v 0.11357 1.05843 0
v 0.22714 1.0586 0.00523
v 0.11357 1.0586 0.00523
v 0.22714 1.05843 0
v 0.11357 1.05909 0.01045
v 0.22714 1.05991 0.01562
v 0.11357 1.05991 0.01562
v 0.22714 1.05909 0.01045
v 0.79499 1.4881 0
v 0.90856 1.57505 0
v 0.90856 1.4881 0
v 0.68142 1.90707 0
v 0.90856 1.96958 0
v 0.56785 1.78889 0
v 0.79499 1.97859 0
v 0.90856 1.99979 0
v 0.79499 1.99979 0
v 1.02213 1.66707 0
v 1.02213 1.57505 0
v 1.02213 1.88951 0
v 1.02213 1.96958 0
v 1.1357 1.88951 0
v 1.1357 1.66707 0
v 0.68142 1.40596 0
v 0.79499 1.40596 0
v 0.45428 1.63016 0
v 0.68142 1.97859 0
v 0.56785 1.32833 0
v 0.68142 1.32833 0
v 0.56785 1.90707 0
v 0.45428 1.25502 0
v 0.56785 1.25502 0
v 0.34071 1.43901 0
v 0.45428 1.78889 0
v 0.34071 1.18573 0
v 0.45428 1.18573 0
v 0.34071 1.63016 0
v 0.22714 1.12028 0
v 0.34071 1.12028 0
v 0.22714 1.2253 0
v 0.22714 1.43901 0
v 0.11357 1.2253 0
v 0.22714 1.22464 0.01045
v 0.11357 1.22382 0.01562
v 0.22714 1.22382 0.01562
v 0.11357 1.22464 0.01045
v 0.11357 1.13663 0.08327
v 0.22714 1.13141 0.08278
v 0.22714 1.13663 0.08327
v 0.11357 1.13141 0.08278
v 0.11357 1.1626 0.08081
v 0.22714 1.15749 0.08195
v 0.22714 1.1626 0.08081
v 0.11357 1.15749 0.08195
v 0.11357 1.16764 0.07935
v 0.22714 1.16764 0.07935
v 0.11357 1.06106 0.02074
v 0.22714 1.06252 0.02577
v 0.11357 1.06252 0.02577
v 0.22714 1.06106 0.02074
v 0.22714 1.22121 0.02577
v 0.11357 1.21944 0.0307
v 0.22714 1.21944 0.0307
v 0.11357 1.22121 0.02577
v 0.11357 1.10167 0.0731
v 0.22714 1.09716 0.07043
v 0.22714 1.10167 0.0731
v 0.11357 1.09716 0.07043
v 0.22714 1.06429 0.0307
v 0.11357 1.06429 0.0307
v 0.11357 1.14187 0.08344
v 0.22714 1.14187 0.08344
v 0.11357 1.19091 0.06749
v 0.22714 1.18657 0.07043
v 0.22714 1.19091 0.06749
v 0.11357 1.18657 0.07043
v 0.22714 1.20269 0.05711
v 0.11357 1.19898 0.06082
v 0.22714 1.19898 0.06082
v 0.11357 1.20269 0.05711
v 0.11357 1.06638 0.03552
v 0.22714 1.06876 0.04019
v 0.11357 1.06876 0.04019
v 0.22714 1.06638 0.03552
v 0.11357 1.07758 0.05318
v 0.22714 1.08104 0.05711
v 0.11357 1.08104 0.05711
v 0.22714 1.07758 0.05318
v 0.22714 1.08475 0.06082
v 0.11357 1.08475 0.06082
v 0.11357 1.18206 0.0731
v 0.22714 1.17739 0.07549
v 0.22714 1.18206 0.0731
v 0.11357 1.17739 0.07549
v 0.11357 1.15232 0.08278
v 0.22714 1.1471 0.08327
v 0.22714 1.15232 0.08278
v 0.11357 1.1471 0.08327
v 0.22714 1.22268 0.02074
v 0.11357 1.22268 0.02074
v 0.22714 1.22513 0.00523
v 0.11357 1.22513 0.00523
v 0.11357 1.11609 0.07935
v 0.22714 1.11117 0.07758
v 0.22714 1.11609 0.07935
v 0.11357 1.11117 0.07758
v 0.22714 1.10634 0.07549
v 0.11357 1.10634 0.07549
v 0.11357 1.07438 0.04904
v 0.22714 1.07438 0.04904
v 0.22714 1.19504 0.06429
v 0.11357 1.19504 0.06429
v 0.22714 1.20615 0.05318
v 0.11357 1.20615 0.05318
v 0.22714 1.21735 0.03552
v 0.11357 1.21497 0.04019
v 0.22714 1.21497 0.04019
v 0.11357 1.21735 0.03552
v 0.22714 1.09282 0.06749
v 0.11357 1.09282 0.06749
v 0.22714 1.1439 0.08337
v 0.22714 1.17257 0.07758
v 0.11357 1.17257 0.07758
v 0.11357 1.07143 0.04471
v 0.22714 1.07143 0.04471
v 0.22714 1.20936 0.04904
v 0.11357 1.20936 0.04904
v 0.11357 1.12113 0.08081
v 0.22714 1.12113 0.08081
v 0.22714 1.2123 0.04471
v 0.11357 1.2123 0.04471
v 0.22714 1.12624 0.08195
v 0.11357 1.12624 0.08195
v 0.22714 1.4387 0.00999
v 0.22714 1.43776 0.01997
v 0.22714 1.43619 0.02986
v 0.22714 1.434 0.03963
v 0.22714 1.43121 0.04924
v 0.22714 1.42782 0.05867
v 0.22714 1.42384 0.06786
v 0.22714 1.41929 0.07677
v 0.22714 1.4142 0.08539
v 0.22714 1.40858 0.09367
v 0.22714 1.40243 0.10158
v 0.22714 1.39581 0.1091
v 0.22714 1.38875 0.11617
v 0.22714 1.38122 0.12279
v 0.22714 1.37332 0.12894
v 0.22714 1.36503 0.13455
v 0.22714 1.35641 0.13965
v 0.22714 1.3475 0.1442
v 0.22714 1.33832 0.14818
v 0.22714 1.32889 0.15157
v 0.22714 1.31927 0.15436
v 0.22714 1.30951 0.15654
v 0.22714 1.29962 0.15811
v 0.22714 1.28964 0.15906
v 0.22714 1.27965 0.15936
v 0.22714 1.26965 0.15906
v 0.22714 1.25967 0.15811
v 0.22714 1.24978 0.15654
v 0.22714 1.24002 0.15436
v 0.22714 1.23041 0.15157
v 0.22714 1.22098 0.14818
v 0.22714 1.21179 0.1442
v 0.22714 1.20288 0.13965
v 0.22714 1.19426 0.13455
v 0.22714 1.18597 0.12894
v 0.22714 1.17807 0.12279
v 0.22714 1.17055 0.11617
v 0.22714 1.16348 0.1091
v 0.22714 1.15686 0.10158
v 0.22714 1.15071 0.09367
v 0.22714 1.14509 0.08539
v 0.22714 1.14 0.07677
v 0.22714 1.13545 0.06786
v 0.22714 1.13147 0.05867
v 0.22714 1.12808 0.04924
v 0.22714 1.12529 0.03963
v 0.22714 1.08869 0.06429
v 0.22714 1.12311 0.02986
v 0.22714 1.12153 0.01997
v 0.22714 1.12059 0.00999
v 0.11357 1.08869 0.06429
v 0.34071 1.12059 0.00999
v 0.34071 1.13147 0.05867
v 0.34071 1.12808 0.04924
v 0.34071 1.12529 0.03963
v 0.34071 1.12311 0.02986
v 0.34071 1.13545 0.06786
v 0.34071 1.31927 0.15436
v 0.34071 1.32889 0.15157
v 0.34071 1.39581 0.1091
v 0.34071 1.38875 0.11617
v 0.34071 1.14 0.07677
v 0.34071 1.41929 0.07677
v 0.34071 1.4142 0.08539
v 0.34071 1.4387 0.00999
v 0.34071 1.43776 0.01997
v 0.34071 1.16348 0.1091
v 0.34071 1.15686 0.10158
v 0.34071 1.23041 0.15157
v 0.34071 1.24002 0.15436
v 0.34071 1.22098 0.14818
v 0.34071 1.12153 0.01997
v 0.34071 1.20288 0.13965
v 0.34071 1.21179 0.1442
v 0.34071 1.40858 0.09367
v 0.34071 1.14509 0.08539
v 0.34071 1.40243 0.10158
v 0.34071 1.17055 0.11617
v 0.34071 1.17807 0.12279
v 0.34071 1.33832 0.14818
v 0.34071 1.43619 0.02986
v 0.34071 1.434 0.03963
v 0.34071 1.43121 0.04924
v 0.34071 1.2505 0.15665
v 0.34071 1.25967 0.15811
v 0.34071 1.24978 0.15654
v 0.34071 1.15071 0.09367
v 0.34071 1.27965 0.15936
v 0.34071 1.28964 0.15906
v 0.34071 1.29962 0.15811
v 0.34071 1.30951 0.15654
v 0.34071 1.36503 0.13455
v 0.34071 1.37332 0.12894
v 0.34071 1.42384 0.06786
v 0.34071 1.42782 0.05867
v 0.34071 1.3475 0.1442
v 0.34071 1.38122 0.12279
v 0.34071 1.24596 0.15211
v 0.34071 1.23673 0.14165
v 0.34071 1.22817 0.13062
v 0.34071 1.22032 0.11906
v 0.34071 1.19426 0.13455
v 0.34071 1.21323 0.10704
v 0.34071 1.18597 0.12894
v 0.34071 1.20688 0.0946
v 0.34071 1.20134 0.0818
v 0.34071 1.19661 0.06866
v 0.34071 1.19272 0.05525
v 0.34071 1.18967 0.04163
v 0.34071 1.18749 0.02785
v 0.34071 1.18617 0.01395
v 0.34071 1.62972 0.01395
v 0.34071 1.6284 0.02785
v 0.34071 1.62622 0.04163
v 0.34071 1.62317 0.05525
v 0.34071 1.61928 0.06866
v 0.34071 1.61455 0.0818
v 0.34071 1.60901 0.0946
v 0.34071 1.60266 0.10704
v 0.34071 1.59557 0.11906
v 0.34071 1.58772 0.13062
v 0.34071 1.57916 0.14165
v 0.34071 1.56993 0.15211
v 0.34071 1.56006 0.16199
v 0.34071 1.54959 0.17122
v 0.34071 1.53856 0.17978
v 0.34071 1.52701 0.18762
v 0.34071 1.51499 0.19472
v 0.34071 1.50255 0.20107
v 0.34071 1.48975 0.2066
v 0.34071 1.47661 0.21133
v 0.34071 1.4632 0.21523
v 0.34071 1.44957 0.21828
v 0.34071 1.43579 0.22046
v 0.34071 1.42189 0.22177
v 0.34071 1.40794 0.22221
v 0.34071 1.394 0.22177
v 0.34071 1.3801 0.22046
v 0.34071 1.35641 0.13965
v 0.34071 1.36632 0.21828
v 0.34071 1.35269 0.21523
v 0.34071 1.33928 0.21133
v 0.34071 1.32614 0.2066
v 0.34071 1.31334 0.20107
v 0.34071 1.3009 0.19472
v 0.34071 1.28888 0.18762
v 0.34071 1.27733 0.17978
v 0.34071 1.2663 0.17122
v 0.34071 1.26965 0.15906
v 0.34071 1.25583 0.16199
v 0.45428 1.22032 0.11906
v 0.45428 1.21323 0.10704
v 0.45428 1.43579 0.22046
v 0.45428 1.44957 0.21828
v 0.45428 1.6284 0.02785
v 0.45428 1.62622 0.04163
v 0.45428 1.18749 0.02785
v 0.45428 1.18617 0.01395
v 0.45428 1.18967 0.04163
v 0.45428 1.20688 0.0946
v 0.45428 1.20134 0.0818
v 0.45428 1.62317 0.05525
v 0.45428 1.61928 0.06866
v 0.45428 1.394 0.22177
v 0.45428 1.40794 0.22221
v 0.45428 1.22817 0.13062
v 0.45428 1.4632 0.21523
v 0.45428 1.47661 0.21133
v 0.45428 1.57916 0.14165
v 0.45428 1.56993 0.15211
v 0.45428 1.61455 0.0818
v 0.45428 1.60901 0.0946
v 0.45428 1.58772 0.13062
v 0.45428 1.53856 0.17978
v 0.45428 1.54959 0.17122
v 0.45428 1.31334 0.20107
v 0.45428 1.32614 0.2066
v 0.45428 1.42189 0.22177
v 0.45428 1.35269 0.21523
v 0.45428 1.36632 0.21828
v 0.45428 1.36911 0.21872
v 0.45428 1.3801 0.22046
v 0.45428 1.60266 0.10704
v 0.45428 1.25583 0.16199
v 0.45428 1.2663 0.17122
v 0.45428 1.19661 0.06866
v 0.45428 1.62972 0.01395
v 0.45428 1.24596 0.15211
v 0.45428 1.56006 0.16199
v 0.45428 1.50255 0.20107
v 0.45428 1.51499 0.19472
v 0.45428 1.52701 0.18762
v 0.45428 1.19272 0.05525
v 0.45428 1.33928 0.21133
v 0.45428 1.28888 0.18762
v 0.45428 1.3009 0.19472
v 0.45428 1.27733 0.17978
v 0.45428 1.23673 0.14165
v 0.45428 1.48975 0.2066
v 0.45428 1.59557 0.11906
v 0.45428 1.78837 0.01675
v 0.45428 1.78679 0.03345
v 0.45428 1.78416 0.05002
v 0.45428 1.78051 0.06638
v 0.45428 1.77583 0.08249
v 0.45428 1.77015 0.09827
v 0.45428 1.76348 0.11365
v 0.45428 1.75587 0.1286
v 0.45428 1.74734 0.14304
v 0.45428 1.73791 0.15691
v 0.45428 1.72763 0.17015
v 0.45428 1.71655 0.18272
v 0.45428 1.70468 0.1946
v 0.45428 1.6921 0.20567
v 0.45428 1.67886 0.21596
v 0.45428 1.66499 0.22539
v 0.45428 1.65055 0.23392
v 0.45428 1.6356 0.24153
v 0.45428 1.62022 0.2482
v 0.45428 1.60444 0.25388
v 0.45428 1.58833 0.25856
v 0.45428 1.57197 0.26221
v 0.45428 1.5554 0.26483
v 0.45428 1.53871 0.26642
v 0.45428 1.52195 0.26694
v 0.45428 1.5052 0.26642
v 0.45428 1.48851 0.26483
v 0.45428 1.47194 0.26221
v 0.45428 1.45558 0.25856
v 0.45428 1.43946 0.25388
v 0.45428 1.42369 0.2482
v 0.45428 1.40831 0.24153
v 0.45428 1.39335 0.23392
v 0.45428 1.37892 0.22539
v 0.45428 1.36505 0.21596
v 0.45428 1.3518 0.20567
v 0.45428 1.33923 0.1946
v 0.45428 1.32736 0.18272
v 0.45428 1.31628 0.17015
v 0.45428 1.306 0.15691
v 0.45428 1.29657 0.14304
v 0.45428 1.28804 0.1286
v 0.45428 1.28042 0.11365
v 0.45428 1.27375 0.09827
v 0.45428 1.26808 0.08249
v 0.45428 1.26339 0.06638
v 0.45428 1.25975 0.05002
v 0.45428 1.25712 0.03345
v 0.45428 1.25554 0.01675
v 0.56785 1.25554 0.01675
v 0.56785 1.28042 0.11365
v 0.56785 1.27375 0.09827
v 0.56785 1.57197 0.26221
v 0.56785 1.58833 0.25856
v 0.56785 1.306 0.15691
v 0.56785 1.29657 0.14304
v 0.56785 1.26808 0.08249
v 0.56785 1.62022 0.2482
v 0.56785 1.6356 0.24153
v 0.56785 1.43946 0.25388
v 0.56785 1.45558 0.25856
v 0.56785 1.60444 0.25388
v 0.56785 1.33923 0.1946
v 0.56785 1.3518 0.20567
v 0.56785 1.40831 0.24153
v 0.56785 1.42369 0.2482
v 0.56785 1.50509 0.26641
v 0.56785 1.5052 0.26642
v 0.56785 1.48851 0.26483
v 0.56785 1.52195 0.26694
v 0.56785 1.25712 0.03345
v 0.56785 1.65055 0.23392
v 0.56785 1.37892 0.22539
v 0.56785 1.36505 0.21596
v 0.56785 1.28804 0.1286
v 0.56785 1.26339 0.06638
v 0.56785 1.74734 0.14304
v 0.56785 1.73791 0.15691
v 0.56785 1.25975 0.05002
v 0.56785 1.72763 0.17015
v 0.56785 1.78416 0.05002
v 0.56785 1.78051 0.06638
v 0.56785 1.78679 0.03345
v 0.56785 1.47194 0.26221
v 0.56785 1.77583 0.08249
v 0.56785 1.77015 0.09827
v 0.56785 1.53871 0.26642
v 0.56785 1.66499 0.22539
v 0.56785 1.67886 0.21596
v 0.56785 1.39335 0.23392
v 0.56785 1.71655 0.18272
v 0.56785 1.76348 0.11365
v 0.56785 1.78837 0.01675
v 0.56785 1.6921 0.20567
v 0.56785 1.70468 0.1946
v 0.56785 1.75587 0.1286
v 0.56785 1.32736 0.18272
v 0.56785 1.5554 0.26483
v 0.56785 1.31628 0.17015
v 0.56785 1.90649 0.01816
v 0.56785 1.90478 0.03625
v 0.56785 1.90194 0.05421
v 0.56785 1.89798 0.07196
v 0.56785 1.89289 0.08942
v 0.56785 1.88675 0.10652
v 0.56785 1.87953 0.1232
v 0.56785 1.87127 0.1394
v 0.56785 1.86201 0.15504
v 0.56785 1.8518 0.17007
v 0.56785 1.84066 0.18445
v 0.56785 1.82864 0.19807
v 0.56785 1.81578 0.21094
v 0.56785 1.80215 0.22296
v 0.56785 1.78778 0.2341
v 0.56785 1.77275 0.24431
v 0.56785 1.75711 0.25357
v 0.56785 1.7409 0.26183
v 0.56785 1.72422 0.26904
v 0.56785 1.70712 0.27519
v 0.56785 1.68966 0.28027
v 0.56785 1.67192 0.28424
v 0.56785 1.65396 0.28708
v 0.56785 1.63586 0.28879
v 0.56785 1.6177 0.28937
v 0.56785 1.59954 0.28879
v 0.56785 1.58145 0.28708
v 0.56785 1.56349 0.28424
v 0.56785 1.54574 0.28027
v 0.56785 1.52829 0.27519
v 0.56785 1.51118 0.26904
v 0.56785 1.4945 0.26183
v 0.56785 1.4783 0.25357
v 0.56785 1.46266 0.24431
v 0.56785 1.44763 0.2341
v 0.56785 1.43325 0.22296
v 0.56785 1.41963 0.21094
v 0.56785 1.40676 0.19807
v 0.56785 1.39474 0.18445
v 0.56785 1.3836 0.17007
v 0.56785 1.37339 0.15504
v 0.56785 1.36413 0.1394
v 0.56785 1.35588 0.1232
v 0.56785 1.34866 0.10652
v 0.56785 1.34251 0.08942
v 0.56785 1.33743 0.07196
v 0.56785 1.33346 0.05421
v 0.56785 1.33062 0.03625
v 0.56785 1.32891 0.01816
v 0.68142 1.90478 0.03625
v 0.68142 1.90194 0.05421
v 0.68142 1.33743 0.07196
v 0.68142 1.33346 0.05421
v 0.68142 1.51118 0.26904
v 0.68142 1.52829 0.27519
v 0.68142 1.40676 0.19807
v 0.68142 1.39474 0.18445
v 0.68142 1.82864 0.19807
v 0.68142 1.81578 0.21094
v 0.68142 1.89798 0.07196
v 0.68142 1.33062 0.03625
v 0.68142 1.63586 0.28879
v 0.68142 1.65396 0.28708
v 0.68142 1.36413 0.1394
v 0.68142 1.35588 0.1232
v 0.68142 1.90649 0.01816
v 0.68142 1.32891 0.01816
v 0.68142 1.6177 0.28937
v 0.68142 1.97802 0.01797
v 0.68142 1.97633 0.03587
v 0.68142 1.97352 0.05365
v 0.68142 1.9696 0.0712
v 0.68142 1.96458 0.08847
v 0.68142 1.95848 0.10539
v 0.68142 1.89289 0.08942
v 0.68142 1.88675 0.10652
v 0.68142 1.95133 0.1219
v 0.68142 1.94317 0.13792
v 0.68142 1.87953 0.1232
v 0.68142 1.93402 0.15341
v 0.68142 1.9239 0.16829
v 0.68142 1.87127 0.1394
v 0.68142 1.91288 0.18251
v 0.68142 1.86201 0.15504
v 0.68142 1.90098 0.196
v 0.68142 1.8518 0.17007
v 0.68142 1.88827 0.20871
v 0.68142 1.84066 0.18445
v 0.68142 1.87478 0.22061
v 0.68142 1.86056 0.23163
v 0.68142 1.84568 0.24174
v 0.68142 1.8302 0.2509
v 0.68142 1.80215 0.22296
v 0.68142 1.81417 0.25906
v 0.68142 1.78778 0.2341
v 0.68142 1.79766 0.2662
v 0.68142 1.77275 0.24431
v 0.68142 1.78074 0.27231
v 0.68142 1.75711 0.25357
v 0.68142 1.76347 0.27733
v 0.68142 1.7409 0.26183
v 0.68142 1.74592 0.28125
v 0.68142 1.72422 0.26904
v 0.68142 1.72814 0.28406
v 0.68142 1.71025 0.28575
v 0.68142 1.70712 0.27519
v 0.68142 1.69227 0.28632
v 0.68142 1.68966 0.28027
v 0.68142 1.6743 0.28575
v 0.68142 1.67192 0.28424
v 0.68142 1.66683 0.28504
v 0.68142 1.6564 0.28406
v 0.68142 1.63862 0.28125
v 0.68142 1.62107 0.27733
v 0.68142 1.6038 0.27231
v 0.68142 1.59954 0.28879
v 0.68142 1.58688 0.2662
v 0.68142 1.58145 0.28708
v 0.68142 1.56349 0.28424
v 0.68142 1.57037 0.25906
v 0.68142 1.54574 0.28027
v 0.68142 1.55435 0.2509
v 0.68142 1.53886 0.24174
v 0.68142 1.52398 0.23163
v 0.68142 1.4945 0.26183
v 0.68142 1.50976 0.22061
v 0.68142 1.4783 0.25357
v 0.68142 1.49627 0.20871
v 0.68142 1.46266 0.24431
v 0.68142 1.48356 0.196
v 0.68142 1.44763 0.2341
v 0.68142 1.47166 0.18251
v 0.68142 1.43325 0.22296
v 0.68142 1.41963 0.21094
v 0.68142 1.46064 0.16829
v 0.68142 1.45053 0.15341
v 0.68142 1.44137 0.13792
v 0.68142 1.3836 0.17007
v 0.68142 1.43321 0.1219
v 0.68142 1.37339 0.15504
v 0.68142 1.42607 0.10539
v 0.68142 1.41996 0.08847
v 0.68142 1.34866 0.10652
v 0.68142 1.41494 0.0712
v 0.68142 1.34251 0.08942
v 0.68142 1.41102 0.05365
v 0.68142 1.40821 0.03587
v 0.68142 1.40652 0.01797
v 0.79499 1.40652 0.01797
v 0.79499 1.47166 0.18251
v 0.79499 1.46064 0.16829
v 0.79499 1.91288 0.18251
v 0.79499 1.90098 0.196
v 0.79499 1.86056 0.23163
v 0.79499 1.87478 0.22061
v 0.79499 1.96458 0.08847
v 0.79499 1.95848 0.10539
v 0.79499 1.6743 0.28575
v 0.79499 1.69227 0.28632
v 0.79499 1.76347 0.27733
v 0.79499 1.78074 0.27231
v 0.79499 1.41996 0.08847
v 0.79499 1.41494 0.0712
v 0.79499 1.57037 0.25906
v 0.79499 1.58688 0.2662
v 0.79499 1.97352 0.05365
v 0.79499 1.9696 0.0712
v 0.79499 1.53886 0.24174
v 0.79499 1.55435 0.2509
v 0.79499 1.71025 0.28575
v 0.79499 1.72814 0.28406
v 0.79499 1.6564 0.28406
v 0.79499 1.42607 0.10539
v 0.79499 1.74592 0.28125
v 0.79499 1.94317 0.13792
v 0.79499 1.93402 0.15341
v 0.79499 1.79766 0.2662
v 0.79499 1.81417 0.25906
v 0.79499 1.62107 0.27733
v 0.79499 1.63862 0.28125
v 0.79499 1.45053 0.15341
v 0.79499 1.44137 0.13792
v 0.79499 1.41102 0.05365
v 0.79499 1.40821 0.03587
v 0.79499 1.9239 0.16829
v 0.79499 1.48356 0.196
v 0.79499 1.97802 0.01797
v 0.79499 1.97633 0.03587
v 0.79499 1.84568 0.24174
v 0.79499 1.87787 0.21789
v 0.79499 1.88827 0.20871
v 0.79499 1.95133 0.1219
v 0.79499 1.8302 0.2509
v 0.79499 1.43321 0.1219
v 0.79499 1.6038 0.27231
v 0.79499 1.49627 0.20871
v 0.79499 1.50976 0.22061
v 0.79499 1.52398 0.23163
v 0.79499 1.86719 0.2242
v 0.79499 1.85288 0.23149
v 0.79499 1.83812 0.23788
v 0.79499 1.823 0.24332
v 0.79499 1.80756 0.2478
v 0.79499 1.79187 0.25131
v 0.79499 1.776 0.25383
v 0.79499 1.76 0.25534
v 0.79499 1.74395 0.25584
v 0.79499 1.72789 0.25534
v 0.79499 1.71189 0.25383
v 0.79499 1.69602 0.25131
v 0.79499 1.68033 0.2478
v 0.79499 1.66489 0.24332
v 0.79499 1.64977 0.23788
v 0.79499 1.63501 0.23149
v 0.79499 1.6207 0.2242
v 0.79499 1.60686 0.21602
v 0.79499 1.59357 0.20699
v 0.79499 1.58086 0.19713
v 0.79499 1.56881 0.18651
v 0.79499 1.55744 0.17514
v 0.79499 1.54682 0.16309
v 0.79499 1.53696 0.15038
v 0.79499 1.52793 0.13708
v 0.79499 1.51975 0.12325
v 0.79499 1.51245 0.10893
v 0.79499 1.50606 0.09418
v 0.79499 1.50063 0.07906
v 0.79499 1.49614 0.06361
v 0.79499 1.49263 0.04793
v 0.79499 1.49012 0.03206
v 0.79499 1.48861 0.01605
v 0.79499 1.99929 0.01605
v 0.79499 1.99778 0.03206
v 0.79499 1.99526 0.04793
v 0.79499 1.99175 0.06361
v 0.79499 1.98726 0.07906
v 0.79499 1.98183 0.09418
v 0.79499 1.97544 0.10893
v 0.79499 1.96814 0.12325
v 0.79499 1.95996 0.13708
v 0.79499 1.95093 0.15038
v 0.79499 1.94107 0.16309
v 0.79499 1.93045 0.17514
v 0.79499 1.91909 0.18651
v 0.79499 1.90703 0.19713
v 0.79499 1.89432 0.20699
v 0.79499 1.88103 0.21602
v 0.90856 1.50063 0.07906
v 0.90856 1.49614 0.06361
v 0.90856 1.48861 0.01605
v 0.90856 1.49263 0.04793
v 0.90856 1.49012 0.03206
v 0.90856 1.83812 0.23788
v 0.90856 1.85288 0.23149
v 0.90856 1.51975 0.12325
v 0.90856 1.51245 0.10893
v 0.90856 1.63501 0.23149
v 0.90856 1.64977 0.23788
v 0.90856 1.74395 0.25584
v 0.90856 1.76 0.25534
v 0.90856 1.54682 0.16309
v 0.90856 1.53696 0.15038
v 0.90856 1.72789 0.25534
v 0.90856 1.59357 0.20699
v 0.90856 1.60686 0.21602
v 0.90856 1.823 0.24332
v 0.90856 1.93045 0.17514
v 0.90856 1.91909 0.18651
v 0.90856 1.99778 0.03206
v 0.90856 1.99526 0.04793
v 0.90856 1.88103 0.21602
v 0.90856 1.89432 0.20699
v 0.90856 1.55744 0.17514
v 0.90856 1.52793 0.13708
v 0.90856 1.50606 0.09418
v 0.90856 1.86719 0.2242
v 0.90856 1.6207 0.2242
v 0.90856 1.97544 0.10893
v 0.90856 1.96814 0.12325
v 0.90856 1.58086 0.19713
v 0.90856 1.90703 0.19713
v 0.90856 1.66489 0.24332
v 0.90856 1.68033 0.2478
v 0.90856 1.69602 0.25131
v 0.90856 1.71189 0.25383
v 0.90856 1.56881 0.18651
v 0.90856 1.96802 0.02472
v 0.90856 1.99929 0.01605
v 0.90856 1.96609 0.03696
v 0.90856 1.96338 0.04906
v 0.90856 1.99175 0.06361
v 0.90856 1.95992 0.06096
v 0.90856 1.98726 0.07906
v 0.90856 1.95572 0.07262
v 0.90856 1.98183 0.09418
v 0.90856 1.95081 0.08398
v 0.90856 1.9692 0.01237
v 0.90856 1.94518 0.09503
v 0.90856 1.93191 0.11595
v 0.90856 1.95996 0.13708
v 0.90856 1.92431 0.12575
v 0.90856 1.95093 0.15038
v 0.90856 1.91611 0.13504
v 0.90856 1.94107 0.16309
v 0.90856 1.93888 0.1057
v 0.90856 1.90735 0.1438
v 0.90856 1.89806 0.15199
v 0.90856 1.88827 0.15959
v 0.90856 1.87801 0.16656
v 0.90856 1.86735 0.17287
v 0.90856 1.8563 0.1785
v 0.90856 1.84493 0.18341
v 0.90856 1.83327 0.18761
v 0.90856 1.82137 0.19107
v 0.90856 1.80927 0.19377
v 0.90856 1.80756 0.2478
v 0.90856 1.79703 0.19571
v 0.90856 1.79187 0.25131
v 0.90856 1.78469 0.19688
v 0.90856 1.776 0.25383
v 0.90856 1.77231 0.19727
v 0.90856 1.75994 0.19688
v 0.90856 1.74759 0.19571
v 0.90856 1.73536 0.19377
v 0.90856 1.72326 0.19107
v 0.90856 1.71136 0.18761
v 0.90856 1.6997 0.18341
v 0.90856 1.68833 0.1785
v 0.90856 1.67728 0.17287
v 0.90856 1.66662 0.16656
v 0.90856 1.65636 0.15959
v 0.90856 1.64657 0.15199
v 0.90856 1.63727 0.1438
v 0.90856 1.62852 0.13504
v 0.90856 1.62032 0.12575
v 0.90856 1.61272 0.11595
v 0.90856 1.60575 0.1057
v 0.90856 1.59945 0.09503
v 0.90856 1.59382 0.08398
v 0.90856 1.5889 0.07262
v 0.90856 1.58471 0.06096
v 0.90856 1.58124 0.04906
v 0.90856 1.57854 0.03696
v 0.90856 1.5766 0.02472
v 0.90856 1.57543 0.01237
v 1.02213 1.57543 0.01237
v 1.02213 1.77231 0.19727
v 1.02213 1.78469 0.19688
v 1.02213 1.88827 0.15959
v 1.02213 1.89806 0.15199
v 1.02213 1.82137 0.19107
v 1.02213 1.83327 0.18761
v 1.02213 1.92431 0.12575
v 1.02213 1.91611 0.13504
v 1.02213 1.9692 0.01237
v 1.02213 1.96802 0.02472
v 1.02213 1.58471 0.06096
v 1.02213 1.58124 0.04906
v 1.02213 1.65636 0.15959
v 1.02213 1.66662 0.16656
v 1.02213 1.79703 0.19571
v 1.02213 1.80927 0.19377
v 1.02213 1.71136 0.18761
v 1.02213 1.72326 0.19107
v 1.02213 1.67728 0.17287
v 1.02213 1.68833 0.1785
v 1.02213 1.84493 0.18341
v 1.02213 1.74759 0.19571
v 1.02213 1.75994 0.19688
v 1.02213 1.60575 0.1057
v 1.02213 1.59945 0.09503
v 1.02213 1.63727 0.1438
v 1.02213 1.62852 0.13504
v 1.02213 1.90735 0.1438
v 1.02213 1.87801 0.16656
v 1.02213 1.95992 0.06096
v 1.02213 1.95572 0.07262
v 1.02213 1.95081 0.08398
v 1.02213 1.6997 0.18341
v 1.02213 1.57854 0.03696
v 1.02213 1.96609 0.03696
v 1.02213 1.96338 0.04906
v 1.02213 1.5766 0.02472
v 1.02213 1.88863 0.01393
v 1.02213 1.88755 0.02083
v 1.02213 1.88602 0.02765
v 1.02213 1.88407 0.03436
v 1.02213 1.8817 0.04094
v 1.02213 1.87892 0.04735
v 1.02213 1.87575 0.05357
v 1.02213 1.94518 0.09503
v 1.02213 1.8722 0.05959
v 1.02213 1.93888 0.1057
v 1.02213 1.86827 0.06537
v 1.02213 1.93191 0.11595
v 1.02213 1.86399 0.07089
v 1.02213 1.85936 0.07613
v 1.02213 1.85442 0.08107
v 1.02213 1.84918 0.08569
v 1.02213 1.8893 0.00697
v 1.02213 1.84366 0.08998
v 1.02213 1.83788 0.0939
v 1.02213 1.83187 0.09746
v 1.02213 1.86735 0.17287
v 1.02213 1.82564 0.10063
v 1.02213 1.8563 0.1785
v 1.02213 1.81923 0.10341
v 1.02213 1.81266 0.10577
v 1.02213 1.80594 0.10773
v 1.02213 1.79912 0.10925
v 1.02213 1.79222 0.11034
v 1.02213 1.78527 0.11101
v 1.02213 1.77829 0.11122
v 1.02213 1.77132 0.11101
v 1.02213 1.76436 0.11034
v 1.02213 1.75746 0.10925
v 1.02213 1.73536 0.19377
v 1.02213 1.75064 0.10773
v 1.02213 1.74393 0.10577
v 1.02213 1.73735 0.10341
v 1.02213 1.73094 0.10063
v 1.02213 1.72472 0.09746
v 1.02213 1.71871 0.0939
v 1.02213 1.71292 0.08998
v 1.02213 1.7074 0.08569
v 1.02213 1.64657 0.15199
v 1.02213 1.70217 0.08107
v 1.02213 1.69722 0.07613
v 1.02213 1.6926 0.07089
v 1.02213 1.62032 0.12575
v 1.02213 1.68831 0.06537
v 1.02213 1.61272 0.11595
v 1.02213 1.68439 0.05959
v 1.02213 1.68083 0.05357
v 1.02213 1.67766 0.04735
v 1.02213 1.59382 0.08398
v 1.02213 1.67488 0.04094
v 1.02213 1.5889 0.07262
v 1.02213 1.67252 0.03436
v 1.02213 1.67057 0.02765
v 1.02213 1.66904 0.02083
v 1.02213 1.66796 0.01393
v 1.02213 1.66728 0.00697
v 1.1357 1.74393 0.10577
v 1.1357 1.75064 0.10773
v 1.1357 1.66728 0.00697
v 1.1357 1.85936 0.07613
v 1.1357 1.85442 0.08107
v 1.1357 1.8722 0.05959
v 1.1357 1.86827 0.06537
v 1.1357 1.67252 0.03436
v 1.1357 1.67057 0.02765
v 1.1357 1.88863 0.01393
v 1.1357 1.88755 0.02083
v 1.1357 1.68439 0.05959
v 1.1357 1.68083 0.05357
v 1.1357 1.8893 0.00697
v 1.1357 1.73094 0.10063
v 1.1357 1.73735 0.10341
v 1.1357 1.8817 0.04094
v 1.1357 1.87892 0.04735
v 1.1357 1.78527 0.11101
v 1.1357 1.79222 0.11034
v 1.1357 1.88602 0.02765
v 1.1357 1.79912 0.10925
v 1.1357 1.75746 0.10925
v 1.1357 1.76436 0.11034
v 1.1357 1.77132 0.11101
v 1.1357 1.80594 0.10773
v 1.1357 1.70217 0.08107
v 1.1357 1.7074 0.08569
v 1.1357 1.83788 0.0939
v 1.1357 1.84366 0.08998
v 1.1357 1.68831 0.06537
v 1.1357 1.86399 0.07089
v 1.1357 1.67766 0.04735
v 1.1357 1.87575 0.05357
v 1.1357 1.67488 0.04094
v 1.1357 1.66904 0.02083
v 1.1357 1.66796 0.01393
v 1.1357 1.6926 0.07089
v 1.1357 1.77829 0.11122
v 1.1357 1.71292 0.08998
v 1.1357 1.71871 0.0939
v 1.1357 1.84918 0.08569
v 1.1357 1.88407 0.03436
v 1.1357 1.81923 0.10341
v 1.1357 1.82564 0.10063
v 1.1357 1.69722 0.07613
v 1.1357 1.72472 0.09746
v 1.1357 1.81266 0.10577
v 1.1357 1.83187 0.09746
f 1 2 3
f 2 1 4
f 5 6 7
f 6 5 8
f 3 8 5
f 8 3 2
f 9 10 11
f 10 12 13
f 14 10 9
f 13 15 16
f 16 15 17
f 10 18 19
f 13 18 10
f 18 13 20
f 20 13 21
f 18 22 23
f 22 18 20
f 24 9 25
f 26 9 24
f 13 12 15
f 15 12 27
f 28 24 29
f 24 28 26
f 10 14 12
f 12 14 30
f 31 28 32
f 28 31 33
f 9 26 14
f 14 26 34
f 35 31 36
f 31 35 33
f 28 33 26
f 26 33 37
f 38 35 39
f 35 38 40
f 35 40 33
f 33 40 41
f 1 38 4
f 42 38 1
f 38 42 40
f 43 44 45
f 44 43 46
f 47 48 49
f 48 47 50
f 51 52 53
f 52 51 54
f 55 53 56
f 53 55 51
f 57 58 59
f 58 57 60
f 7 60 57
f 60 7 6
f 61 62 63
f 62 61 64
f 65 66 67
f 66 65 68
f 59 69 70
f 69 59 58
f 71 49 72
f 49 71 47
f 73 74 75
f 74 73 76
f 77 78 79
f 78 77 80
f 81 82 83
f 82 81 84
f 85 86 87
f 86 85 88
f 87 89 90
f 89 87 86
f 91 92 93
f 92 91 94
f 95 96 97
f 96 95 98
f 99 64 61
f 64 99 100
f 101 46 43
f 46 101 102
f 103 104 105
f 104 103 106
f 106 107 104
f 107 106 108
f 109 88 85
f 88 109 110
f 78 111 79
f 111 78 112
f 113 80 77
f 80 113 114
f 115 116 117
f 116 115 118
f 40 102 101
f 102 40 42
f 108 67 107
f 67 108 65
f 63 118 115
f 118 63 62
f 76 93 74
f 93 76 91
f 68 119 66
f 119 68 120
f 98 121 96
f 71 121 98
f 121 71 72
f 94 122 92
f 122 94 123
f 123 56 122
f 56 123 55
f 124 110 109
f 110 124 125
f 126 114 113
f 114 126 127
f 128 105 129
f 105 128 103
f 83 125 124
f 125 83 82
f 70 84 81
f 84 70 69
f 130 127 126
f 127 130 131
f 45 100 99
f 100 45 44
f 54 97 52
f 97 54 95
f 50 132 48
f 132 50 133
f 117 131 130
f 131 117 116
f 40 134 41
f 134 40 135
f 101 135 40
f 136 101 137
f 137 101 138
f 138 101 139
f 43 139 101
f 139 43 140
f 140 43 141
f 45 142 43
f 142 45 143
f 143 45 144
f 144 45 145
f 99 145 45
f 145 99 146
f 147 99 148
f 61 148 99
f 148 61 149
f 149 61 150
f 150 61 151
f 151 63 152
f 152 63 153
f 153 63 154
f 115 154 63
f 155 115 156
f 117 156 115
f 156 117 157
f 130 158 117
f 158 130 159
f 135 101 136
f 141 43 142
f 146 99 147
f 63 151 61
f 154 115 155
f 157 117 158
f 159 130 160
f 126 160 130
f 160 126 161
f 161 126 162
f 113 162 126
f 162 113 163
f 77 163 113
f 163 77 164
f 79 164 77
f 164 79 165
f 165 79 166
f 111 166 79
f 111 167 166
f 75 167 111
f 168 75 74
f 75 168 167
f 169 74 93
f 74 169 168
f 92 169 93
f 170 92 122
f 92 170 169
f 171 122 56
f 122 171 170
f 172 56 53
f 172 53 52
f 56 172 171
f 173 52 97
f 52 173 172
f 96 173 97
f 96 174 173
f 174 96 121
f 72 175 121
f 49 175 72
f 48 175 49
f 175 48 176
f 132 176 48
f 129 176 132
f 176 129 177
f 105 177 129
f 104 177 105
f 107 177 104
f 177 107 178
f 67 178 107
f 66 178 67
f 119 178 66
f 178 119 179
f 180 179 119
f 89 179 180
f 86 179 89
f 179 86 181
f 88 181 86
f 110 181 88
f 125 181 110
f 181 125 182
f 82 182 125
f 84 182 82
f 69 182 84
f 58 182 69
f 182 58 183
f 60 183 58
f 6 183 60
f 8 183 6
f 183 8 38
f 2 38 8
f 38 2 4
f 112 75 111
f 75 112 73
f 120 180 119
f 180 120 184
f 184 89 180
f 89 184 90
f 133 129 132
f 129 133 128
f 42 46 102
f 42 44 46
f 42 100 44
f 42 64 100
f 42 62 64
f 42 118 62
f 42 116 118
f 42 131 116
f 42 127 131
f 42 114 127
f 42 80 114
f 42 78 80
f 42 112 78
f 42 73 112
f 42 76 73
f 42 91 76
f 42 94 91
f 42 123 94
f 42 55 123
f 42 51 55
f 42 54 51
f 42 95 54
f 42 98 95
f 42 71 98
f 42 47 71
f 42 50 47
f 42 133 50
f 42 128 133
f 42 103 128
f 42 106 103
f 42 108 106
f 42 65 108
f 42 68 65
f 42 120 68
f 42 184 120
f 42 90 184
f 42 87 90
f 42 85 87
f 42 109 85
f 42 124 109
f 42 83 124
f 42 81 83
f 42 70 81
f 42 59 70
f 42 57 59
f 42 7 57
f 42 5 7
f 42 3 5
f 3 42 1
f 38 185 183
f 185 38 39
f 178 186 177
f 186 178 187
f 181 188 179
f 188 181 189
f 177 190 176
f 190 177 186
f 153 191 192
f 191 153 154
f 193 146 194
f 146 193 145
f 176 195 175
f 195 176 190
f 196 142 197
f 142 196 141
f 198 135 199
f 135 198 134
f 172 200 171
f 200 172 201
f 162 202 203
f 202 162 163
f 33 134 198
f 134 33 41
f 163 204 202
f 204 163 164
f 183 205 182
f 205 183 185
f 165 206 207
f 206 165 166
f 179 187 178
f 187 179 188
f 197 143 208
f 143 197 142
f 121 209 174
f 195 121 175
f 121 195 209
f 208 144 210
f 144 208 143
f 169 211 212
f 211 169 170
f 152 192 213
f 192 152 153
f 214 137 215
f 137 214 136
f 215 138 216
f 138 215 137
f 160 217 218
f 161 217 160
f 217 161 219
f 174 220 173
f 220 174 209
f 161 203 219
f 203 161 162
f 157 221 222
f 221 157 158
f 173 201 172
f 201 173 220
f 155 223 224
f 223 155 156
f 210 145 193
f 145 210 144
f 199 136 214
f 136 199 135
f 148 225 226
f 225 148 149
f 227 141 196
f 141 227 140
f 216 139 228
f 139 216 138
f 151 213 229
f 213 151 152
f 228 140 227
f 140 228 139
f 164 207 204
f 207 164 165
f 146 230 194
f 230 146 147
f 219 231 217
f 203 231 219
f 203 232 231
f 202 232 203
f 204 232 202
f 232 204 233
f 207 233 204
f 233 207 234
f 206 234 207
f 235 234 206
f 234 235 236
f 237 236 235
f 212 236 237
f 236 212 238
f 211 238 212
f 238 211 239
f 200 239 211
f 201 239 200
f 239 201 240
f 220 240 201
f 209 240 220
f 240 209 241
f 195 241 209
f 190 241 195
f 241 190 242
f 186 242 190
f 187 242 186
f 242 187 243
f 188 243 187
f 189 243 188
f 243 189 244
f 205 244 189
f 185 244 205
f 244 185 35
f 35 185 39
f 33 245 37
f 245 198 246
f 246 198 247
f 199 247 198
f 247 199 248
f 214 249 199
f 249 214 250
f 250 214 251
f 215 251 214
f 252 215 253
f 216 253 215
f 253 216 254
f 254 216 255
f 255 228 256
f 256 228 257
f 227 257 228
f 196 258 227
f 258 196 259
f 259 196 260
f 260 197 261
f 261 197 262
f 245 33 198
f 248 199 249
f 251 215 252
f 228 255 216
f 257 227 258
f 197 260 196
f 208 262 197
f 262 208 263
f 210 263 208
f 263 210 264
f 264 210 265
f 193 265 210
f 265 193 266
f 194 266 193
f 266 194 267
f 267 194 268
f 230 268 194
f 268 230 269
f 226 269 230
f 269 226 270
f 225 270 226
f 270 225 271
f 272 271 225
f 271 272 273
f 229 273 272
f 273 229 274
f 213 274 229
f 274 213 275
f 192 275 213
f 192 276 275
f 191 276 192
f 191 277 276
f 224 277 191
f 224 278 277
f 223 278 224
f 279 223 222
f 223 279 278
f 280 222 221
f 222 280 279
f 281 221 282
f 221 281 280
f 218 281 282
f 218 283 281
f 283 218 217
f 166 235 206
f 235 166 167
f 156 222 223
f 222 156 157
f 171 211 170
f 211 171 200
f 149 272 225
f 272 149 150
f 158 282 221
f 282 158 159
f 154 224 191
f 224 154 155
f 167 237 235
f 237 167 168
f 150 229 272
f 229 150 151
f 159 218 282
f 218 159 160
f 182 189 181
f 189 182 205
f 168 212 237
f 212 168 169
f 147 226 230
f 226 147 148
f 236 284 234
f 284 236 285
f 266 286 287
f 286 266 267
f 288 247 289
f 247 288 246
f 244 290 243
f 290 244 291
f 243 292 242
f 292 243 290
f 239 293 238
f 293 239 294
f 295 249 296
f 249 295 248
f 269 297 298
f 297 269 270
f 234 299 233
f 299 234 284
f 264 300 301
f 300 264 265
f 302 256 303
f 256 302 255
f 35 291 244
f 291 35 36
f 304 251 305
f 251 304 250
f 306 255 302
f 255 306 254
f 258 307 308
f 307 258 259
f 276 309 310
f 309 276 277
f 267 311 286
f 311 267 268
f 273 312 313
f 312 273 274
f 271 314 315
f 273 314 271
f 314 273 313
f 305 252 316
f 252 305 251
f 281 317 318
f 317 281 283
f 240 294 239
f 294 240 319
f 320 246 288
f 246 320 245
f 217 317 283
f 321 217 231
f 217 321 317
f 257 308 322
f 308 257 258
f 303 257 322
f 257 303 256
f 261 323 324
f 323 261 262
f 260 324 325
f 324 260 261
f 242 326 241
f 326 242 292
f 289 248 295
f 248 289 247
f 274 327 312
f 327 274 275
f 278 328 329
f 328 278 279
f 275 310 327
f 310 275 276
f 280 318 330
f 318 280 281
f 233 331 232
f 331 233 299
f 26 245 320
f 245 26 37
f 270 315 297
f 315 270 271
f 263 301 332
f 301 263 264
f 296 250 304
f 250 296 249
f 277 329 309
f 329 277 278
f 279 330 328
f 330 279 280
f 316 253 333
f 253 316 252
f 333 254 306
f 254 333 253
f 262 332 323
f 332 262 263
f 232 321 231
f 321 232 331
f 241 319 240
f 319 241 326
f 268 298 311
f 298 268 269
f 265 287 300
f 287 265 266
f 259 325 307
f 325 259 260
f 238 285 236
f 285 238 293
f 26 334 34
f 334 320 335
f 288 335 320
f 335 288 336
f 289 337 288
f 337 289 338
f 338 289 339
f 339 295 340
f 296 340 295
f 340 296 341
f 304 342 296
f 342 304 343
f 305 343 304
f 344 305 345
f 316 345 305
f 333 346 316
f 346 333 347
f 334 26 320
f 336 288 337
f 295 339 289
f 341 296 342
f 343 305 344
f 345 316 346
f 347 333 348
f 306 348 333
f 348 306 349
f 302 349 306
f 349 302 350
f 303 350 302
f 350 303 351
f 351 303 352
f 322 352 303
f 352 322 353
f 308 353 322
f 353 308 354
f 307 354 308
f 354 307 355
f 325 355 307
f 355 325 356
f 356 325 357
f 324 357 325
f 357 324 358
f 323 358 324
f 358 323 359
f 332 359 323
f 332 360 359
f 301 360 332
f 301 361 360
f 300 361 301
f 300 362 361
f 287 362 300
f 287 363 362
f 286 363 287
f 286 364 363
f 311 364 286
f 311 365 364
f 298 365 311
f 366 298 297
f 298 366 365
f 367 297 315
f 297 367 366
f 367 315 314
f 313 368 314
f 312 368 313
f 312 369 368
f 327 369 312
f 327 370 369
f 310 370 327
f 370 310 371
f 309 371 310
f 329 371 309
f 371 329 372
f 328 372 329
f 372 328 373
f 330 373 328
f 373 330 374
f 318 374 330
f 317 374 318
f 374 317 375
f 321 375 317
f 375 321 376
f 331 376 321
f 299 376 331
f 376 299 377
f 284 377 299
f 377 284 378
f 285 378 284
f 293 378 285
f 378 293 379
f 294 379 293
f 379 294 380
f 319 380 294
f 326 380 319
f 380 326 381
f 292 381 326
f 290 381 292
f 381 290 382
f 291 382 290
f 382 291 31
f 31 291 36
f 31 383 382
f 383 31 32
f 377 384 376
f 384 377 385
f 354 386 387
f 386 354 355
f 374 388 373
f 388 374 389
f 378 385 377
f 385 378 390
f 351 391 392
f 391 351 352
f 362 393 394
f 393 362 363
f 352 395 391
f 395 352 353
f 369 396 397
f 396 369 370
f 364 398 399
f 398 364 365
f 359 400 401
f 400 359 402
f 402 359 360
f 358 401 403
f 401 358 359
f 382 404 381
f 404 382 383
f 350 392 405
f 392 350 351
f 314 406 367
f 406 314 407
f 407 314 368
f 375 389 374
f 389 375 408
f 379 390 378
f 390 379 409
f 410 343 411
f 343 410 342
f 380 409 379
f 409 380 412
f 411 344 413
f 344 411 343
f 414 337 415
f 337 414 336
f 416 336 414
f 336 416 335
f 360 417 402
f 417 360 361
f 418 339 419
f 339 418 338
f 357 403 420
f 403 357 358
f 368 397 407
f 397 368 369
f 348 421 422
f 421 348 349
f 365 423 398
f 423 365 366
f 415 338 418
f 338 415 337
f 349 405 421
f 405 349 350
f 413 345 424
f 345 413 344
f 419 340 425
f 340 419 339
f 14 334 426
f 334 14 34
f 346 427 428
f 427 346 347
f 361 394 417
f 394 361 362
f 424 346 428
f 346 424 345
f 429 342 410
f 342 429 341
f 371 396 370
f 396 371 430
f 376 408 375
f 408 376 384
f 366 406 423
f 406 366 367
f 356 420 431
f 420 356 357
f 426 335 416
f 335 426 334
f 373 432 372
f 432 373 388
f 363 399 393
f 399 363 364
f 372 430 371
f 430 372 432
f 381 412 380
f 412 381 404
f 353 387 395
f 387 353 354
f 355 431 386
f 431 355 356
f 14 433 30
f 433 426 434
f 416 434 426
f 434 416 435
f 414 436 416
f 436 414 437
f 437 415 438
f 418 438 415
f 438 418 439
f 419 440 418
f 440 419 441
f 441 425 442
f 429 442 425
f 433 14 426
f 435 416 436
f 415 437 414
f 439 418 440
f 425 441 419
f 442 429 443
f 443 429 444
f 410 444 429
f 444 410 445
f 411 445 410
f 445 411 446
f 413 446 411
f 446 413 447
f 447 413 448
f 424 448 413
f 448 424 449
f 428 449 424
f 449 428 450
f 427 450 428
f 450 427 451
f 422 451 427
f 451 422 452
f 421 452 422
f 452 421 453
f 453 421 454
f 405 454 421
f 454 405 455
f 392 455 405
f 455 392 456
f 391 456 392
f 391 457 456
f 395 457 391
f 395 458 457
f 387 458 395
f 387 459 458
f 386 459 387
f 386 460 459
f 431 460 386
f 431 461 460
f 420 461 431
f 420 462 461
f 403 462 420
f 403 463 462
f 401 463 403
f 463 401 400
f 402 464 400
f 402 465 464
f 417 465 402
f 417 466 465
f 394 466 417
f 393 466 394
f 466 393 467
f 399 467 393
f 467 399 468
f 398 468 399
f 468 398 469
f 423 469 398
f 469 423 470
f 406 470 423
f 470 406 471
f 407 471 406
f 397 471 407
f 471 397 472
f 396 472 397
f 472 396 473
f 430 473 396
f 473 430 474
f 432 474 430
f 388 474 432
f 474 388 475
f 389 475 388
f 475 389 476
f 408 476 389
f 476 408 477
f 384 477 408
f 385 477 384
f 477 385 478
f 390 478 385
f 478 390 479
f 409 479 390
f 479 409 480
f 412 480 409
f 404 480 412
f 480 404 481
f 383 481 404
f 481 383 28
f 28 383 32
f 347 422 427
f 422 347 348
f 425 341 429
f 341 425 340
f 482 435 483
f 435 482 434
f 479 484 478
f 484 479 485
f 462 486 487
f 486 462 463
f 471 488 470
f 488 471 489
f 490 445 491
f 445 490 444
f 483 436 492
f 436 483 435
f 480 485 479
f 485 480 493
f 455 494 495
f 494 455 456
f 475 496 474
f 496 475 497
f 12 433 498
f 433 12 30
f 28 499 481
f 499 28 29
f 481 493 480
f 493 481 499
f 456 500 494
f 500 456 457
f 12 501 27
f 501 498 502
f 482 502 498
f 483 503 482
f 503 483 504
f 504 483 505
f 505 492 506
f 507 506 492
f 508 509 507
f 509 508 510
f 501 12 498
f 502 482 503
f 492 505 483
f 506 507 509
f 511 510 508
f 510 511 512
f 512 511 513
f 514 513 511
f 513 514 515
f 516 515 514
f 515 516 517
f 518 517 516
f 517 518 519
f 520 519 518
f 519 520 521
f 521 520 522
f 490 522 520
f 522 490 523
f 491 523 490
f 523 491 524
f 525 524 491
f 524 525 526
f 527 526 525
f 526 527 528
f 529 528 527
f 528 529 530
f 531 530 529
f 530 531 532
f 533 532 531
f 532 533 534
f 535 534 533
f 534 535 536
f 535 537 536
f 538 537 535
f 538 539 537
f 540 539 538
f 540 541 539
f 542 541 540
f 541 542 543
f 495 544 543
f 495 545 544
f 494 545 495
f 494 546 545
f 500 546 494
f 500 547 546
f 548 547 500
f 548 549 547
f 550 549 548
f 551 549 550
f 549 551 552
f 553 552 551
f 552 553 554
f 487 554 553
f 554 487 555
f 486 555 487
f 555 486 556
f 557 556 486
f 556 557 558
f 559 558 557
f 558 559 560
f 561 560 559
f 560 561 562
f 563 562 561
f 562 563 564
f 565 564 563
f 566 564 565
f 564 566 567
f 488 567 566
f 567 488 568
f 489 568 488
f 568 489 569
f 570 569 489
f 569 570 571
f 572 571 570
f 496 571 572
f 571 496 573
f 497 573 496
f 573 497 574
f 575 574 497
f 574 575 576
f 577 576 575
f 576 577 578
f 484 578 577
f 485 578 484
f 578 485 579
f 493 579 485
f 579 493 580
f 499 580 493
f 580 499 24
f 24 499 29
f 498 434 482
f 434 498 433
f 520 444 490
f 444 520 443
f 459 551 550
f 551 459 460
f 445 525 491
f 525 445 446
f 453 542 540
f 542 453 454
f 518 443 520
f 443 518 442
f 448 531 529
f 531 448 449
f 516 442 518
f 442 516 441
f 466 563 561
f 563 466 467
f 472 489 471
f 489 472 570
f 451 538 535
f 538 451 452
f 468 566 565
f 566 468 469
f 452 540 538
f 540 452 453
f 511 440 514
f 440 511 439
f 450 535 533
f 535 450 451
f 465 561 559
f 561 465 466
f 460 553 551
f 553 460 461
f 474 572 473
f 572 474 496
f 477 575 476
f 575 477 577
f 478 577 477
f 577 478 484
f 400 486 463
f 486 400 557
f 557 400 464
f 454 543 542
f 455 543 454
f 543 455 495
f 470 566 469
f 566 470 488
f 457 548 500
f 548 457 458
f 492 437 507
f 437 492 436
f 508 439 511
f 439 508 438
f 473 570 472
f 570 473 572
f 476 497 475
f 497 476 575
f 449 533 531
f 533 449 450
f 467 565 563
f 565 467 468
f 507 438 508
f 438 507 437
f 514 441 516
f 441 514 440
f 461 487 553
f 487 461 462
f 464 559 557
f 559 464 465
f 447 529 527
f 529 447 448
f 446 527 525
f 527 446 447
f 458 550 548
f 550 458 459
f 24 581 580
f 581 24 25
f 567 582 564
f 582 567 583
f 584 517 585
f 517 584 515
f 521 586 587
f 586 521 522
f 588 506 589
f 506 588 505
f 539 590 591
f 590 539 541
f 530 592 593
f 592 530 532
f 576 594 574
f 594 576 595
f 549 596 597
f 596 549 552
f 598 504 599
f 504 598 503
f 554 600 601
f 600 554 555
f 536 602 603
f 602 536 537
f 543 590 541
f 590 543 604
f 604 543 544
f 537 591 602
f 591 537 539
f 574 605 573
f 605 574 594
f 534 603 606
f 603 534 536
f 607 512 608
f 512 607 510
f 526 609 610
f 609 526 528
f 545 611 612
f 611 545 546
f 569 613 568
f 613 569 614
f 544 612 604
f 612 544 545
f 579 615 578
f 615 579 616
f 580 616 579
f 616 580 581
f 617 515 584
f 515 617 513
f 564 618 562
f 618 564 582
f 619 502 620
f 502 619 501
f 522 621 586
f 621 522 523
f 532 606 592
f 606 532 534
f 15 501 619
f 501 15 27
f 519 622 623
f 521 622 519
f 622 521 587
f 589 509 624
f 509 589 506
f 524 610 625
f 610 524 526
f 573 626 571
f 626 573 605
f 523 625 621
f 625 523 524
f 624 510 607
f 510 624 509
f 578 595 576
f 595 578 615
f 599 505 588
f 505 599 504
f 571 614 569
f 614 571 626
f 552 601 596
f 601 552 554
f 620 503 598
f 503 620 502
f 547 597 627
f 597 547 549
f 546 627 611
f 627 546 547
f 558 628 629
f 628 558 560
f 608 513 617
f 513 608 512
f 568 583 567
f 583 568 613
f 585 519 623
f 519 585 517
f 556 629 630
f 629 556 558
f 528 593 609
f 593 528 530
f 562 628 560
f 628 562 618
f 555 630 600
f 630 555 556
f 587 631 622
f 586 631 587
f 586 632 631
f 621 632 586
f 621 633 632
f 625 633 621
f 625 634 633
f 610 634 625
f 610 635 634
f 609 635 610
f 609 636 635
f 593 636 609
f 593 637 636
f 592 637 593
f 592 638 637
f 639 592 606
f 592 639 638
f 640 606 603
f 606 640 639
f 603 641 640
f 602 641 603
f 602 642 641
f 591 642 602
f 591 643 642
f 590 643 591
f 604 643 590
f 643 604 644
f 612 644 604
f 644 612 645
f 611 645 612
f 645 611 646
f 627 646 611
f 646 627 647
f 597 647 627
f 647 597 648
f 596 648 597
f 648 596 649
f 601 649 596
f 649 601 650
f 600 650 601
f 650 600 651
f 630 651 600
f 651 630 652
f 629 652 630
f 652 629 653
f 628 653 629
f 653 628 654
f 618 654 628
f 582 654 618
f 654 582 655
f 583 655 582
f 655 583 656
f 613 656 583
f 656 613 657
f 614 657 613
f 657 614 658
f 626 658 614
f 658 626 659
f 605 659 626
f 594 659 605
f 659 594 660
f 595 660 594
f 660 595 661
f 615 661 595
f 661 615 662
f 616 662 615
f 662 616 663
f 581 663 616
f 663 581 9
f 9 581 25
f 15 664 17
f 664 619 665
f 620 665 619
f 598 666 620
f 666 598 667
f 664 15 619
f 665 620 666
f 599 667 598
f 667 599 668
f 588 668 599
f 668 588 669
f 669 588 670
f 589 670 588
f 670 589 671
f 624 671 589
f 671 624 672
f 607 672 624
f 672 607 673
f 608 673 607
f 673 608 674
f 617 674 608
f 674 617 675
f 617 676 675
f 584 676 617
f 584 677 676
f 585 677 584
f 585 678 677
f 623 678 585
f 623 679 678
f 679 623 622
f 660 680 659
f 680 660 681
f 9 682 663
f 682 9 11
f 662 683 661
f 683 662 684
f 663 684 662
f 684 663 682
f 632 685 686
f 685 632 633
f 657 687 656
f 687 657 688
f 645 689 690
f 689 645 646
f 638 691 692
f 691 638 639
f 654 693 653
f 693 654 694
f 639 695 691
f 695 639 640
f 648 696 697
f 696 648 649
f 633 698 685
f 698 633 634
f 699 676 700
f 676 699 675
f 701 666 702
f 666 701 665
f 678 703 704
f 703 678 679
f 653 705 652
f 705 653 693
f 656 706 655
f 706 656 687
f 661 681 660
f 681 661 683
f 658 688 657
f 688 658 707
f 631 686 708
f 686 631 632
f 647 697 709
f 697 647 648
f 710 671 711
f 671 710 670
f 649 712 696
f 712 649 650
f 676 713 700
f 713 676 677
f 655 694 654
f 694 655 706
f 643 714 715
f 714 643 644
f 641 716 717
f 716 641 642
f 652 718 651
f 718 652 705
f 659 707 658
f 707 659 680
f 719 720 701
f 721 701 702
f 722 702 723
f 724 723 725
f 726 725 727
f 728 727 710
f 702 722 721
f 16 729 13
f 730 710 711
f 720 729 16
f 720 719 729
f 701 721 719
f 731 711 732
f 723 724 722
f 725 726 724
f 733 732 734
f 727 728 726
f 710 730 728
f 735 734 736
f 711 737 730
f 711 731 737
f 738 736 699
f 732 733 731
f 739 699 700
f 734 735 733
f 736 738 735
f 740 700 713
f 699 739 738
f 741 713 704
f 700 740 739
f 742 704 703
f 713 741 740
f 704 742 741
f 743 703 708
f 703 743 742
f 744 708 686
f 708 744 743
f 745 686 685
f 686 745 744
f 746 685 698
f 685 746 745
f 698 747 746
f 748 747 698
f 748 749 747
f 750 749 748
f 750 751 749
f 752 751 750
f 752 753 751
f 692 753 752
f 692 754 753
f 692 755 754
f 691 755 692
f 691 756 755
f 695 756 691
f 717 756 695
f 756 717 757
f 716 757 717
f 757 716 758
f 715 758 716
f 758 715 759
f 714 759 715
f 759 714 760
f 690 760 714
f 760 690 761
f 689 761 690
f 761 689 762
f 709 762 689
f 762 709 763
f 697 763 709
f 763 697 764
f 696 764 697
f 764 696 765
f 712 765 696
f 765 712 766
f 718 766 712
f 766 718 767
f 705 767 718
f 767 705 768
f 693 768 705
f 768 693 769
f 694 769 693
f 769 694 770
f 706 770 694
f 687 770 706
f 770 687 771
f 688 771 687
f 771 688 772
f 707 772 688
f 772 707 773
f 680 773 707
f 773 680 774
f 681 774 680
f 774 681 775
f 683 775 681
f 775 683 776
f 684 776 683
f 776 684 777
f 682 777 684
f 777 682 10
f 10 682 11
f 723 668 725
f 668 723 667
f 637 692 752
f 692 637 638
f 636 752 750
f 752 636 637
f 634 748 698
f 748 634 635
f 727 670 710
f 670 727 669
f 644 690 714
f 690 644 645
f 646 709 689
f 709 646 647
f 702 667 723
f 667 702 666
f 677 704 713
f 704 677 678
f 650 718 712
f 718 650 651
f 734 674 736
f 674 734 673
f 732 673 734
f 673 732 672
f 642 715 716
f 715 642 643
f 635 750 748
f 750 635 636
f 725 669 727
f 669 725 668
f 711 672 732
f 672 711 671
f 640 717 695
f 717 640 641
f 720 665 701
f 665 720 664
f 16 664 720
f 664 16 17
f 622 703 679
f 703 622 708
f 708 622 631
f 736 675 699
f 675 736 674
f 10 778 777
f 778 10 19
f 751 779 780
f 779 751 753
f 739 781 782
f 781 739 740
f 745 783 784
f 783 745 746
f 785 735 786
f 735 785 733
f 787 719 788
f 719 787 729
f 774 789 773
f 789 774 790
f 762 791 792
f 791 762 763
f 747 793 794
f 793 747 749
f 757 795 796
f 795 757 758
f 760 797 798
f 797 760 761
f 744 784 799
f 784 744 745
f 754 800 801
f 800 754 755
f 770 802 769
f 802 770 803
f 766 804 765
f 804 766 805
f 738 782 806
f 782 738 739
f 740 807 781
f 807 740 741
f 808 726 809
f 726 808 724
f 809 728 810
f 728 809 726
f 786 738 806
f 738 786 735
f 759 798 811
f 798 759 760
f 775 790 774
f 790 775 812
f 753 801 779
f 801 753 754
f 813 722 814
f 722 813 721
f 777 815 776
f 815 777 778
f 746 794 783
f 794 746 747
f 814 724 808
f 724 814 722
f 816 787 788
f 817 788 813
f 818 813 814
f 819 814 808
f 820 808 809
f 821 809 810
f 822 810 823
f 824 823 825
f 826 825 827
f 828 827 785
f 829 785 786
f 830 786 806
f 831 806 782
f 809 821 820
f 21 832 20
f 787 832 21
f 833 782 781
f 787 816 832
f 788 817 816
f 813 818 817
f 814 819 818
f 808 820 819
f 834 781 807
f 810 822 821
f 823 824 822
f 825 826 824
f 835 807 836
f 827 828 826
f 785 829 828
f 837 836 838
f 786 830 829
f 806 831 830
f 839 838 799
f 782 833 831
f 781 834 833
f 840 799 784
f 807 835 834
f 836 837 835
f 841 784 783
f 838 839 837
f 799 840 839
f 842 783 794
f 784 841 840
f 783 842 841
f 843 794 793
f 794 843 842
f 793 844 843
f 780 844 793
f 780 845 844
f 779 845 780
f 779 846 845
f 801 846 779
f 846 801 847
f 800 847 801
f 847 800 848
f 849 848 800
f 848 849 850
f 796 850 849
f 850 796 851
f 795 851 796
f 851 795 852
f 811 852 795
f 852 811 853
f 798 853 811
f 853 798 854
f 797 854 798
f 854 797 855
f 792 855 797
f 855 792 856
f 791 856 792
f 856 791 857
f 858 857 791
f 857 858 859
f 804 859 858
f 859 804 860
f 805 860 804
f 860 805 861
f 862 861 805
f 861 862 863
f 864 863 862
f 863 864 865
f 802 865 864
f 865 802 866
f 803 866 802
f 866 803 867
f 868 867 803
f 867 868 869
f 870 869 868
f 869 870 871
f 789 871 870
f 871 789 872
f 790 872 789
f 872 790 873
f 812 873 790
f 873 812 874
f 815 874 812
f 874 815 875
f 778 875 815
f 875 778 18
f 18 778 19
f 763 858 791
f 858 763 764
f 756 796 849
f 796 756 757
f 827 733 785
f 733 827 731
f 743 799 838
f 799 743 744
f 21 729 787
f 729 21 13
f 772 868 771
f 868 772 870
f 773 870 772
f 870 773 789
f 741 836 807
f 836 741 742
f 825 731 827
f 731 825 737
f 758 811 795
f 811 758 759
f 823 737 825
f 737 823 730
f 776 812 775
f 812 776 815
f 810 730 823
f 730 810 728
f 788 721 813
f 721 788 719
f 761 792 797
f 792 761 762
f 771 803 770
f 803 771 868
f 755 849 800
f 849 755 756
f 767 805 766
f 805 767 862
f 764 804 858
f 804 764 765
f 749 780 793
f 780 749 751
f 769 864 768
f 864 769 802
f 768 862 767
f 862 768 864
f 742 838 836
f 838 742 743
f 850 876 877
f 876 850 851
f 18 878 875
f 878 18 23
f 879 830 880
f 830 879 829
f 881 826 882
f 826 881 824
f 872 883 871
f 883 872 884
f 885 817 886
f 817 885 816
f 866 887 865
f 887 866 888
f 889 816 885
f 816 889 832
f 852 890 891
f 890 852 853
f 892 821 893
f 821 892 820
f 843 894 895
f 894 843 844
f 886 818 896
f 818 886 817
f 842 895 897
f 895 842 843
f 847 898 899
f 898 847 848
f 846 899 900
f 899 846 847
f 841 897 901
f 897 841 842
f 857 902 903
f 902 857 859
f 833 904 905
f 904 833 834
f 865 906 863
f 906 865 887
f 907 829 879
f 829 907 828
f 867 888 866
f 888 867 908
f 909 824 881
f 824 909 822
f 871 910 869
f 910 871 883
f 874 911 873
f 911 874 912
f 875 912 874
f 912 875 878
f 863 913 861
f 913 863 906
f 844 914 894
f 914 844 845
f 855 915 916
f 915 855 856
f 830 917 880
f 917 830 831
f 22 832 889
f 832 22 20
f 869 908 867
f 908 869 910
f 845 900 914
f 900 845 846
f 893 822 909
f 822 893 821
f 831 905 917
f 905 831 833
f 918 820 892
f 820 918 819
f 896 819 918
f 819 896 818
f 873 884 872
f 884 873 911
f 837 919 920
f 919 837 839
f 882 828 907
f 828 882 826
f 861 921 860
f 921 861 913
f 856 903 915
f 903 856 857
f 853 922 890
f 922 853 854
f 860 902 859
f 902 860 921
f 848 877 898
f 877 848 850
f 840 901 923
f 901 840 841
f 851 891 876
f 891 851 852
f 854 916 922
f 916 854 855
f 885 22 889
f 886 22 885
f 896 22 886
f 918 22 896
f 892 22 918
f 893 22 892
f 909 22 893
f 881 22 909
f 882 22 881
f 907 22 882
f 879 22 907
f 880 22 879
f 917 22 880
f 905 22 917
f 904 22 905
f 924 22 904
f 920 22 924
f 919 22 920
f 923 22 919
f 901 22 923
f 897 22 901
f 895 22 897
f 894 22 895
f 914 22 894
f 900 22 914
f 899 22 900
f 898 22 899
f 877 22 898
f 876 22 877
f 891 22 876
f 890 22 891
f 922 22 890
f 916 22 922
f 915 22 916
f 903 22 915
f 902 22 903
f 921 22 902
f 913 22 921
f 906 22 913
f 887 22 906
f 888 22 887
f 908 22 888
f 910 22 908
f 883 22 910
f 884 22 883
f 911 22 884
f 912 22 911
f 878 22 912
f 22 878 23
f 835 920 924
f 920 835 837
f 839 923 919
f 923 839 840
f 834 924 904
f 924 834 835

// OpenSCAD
$fn = 100;

// Functions
//function f(x) = sqrt(1 - pow(x,2));
//function g(x) = -f(x);
//a = -1;
//b = 1;
//steps = 10;

// function for curves
function f(x) = 1+sin(2*x*180/3.14);
function g(x) = exp(x/2);
a = 0;
b = 1.1357;
steps = 10;

semi_circles(a,b,steps);

// Don't edit below this line
// -----------------------------------------------------------------------------
// -----------------------------------------------------------------------------
// -----------------------------------------------------------------------------

module semi_circles(a = -1, b = 1, steps = 10) {

    step_size = (b-a)/steps;
    
    union() {
        for (x = [a:step_size:b-step_size]) {
            d = f(x)-g(x);
            
            translate([step_size+x,d/2+g(x),0])
            rotate([0,-90,0])
            linear_extrude(step_size)
            difference() {
                circle(d = d);
                translate([-d/2,0,0])square(d,center = true);
            }
        }
    }
}
